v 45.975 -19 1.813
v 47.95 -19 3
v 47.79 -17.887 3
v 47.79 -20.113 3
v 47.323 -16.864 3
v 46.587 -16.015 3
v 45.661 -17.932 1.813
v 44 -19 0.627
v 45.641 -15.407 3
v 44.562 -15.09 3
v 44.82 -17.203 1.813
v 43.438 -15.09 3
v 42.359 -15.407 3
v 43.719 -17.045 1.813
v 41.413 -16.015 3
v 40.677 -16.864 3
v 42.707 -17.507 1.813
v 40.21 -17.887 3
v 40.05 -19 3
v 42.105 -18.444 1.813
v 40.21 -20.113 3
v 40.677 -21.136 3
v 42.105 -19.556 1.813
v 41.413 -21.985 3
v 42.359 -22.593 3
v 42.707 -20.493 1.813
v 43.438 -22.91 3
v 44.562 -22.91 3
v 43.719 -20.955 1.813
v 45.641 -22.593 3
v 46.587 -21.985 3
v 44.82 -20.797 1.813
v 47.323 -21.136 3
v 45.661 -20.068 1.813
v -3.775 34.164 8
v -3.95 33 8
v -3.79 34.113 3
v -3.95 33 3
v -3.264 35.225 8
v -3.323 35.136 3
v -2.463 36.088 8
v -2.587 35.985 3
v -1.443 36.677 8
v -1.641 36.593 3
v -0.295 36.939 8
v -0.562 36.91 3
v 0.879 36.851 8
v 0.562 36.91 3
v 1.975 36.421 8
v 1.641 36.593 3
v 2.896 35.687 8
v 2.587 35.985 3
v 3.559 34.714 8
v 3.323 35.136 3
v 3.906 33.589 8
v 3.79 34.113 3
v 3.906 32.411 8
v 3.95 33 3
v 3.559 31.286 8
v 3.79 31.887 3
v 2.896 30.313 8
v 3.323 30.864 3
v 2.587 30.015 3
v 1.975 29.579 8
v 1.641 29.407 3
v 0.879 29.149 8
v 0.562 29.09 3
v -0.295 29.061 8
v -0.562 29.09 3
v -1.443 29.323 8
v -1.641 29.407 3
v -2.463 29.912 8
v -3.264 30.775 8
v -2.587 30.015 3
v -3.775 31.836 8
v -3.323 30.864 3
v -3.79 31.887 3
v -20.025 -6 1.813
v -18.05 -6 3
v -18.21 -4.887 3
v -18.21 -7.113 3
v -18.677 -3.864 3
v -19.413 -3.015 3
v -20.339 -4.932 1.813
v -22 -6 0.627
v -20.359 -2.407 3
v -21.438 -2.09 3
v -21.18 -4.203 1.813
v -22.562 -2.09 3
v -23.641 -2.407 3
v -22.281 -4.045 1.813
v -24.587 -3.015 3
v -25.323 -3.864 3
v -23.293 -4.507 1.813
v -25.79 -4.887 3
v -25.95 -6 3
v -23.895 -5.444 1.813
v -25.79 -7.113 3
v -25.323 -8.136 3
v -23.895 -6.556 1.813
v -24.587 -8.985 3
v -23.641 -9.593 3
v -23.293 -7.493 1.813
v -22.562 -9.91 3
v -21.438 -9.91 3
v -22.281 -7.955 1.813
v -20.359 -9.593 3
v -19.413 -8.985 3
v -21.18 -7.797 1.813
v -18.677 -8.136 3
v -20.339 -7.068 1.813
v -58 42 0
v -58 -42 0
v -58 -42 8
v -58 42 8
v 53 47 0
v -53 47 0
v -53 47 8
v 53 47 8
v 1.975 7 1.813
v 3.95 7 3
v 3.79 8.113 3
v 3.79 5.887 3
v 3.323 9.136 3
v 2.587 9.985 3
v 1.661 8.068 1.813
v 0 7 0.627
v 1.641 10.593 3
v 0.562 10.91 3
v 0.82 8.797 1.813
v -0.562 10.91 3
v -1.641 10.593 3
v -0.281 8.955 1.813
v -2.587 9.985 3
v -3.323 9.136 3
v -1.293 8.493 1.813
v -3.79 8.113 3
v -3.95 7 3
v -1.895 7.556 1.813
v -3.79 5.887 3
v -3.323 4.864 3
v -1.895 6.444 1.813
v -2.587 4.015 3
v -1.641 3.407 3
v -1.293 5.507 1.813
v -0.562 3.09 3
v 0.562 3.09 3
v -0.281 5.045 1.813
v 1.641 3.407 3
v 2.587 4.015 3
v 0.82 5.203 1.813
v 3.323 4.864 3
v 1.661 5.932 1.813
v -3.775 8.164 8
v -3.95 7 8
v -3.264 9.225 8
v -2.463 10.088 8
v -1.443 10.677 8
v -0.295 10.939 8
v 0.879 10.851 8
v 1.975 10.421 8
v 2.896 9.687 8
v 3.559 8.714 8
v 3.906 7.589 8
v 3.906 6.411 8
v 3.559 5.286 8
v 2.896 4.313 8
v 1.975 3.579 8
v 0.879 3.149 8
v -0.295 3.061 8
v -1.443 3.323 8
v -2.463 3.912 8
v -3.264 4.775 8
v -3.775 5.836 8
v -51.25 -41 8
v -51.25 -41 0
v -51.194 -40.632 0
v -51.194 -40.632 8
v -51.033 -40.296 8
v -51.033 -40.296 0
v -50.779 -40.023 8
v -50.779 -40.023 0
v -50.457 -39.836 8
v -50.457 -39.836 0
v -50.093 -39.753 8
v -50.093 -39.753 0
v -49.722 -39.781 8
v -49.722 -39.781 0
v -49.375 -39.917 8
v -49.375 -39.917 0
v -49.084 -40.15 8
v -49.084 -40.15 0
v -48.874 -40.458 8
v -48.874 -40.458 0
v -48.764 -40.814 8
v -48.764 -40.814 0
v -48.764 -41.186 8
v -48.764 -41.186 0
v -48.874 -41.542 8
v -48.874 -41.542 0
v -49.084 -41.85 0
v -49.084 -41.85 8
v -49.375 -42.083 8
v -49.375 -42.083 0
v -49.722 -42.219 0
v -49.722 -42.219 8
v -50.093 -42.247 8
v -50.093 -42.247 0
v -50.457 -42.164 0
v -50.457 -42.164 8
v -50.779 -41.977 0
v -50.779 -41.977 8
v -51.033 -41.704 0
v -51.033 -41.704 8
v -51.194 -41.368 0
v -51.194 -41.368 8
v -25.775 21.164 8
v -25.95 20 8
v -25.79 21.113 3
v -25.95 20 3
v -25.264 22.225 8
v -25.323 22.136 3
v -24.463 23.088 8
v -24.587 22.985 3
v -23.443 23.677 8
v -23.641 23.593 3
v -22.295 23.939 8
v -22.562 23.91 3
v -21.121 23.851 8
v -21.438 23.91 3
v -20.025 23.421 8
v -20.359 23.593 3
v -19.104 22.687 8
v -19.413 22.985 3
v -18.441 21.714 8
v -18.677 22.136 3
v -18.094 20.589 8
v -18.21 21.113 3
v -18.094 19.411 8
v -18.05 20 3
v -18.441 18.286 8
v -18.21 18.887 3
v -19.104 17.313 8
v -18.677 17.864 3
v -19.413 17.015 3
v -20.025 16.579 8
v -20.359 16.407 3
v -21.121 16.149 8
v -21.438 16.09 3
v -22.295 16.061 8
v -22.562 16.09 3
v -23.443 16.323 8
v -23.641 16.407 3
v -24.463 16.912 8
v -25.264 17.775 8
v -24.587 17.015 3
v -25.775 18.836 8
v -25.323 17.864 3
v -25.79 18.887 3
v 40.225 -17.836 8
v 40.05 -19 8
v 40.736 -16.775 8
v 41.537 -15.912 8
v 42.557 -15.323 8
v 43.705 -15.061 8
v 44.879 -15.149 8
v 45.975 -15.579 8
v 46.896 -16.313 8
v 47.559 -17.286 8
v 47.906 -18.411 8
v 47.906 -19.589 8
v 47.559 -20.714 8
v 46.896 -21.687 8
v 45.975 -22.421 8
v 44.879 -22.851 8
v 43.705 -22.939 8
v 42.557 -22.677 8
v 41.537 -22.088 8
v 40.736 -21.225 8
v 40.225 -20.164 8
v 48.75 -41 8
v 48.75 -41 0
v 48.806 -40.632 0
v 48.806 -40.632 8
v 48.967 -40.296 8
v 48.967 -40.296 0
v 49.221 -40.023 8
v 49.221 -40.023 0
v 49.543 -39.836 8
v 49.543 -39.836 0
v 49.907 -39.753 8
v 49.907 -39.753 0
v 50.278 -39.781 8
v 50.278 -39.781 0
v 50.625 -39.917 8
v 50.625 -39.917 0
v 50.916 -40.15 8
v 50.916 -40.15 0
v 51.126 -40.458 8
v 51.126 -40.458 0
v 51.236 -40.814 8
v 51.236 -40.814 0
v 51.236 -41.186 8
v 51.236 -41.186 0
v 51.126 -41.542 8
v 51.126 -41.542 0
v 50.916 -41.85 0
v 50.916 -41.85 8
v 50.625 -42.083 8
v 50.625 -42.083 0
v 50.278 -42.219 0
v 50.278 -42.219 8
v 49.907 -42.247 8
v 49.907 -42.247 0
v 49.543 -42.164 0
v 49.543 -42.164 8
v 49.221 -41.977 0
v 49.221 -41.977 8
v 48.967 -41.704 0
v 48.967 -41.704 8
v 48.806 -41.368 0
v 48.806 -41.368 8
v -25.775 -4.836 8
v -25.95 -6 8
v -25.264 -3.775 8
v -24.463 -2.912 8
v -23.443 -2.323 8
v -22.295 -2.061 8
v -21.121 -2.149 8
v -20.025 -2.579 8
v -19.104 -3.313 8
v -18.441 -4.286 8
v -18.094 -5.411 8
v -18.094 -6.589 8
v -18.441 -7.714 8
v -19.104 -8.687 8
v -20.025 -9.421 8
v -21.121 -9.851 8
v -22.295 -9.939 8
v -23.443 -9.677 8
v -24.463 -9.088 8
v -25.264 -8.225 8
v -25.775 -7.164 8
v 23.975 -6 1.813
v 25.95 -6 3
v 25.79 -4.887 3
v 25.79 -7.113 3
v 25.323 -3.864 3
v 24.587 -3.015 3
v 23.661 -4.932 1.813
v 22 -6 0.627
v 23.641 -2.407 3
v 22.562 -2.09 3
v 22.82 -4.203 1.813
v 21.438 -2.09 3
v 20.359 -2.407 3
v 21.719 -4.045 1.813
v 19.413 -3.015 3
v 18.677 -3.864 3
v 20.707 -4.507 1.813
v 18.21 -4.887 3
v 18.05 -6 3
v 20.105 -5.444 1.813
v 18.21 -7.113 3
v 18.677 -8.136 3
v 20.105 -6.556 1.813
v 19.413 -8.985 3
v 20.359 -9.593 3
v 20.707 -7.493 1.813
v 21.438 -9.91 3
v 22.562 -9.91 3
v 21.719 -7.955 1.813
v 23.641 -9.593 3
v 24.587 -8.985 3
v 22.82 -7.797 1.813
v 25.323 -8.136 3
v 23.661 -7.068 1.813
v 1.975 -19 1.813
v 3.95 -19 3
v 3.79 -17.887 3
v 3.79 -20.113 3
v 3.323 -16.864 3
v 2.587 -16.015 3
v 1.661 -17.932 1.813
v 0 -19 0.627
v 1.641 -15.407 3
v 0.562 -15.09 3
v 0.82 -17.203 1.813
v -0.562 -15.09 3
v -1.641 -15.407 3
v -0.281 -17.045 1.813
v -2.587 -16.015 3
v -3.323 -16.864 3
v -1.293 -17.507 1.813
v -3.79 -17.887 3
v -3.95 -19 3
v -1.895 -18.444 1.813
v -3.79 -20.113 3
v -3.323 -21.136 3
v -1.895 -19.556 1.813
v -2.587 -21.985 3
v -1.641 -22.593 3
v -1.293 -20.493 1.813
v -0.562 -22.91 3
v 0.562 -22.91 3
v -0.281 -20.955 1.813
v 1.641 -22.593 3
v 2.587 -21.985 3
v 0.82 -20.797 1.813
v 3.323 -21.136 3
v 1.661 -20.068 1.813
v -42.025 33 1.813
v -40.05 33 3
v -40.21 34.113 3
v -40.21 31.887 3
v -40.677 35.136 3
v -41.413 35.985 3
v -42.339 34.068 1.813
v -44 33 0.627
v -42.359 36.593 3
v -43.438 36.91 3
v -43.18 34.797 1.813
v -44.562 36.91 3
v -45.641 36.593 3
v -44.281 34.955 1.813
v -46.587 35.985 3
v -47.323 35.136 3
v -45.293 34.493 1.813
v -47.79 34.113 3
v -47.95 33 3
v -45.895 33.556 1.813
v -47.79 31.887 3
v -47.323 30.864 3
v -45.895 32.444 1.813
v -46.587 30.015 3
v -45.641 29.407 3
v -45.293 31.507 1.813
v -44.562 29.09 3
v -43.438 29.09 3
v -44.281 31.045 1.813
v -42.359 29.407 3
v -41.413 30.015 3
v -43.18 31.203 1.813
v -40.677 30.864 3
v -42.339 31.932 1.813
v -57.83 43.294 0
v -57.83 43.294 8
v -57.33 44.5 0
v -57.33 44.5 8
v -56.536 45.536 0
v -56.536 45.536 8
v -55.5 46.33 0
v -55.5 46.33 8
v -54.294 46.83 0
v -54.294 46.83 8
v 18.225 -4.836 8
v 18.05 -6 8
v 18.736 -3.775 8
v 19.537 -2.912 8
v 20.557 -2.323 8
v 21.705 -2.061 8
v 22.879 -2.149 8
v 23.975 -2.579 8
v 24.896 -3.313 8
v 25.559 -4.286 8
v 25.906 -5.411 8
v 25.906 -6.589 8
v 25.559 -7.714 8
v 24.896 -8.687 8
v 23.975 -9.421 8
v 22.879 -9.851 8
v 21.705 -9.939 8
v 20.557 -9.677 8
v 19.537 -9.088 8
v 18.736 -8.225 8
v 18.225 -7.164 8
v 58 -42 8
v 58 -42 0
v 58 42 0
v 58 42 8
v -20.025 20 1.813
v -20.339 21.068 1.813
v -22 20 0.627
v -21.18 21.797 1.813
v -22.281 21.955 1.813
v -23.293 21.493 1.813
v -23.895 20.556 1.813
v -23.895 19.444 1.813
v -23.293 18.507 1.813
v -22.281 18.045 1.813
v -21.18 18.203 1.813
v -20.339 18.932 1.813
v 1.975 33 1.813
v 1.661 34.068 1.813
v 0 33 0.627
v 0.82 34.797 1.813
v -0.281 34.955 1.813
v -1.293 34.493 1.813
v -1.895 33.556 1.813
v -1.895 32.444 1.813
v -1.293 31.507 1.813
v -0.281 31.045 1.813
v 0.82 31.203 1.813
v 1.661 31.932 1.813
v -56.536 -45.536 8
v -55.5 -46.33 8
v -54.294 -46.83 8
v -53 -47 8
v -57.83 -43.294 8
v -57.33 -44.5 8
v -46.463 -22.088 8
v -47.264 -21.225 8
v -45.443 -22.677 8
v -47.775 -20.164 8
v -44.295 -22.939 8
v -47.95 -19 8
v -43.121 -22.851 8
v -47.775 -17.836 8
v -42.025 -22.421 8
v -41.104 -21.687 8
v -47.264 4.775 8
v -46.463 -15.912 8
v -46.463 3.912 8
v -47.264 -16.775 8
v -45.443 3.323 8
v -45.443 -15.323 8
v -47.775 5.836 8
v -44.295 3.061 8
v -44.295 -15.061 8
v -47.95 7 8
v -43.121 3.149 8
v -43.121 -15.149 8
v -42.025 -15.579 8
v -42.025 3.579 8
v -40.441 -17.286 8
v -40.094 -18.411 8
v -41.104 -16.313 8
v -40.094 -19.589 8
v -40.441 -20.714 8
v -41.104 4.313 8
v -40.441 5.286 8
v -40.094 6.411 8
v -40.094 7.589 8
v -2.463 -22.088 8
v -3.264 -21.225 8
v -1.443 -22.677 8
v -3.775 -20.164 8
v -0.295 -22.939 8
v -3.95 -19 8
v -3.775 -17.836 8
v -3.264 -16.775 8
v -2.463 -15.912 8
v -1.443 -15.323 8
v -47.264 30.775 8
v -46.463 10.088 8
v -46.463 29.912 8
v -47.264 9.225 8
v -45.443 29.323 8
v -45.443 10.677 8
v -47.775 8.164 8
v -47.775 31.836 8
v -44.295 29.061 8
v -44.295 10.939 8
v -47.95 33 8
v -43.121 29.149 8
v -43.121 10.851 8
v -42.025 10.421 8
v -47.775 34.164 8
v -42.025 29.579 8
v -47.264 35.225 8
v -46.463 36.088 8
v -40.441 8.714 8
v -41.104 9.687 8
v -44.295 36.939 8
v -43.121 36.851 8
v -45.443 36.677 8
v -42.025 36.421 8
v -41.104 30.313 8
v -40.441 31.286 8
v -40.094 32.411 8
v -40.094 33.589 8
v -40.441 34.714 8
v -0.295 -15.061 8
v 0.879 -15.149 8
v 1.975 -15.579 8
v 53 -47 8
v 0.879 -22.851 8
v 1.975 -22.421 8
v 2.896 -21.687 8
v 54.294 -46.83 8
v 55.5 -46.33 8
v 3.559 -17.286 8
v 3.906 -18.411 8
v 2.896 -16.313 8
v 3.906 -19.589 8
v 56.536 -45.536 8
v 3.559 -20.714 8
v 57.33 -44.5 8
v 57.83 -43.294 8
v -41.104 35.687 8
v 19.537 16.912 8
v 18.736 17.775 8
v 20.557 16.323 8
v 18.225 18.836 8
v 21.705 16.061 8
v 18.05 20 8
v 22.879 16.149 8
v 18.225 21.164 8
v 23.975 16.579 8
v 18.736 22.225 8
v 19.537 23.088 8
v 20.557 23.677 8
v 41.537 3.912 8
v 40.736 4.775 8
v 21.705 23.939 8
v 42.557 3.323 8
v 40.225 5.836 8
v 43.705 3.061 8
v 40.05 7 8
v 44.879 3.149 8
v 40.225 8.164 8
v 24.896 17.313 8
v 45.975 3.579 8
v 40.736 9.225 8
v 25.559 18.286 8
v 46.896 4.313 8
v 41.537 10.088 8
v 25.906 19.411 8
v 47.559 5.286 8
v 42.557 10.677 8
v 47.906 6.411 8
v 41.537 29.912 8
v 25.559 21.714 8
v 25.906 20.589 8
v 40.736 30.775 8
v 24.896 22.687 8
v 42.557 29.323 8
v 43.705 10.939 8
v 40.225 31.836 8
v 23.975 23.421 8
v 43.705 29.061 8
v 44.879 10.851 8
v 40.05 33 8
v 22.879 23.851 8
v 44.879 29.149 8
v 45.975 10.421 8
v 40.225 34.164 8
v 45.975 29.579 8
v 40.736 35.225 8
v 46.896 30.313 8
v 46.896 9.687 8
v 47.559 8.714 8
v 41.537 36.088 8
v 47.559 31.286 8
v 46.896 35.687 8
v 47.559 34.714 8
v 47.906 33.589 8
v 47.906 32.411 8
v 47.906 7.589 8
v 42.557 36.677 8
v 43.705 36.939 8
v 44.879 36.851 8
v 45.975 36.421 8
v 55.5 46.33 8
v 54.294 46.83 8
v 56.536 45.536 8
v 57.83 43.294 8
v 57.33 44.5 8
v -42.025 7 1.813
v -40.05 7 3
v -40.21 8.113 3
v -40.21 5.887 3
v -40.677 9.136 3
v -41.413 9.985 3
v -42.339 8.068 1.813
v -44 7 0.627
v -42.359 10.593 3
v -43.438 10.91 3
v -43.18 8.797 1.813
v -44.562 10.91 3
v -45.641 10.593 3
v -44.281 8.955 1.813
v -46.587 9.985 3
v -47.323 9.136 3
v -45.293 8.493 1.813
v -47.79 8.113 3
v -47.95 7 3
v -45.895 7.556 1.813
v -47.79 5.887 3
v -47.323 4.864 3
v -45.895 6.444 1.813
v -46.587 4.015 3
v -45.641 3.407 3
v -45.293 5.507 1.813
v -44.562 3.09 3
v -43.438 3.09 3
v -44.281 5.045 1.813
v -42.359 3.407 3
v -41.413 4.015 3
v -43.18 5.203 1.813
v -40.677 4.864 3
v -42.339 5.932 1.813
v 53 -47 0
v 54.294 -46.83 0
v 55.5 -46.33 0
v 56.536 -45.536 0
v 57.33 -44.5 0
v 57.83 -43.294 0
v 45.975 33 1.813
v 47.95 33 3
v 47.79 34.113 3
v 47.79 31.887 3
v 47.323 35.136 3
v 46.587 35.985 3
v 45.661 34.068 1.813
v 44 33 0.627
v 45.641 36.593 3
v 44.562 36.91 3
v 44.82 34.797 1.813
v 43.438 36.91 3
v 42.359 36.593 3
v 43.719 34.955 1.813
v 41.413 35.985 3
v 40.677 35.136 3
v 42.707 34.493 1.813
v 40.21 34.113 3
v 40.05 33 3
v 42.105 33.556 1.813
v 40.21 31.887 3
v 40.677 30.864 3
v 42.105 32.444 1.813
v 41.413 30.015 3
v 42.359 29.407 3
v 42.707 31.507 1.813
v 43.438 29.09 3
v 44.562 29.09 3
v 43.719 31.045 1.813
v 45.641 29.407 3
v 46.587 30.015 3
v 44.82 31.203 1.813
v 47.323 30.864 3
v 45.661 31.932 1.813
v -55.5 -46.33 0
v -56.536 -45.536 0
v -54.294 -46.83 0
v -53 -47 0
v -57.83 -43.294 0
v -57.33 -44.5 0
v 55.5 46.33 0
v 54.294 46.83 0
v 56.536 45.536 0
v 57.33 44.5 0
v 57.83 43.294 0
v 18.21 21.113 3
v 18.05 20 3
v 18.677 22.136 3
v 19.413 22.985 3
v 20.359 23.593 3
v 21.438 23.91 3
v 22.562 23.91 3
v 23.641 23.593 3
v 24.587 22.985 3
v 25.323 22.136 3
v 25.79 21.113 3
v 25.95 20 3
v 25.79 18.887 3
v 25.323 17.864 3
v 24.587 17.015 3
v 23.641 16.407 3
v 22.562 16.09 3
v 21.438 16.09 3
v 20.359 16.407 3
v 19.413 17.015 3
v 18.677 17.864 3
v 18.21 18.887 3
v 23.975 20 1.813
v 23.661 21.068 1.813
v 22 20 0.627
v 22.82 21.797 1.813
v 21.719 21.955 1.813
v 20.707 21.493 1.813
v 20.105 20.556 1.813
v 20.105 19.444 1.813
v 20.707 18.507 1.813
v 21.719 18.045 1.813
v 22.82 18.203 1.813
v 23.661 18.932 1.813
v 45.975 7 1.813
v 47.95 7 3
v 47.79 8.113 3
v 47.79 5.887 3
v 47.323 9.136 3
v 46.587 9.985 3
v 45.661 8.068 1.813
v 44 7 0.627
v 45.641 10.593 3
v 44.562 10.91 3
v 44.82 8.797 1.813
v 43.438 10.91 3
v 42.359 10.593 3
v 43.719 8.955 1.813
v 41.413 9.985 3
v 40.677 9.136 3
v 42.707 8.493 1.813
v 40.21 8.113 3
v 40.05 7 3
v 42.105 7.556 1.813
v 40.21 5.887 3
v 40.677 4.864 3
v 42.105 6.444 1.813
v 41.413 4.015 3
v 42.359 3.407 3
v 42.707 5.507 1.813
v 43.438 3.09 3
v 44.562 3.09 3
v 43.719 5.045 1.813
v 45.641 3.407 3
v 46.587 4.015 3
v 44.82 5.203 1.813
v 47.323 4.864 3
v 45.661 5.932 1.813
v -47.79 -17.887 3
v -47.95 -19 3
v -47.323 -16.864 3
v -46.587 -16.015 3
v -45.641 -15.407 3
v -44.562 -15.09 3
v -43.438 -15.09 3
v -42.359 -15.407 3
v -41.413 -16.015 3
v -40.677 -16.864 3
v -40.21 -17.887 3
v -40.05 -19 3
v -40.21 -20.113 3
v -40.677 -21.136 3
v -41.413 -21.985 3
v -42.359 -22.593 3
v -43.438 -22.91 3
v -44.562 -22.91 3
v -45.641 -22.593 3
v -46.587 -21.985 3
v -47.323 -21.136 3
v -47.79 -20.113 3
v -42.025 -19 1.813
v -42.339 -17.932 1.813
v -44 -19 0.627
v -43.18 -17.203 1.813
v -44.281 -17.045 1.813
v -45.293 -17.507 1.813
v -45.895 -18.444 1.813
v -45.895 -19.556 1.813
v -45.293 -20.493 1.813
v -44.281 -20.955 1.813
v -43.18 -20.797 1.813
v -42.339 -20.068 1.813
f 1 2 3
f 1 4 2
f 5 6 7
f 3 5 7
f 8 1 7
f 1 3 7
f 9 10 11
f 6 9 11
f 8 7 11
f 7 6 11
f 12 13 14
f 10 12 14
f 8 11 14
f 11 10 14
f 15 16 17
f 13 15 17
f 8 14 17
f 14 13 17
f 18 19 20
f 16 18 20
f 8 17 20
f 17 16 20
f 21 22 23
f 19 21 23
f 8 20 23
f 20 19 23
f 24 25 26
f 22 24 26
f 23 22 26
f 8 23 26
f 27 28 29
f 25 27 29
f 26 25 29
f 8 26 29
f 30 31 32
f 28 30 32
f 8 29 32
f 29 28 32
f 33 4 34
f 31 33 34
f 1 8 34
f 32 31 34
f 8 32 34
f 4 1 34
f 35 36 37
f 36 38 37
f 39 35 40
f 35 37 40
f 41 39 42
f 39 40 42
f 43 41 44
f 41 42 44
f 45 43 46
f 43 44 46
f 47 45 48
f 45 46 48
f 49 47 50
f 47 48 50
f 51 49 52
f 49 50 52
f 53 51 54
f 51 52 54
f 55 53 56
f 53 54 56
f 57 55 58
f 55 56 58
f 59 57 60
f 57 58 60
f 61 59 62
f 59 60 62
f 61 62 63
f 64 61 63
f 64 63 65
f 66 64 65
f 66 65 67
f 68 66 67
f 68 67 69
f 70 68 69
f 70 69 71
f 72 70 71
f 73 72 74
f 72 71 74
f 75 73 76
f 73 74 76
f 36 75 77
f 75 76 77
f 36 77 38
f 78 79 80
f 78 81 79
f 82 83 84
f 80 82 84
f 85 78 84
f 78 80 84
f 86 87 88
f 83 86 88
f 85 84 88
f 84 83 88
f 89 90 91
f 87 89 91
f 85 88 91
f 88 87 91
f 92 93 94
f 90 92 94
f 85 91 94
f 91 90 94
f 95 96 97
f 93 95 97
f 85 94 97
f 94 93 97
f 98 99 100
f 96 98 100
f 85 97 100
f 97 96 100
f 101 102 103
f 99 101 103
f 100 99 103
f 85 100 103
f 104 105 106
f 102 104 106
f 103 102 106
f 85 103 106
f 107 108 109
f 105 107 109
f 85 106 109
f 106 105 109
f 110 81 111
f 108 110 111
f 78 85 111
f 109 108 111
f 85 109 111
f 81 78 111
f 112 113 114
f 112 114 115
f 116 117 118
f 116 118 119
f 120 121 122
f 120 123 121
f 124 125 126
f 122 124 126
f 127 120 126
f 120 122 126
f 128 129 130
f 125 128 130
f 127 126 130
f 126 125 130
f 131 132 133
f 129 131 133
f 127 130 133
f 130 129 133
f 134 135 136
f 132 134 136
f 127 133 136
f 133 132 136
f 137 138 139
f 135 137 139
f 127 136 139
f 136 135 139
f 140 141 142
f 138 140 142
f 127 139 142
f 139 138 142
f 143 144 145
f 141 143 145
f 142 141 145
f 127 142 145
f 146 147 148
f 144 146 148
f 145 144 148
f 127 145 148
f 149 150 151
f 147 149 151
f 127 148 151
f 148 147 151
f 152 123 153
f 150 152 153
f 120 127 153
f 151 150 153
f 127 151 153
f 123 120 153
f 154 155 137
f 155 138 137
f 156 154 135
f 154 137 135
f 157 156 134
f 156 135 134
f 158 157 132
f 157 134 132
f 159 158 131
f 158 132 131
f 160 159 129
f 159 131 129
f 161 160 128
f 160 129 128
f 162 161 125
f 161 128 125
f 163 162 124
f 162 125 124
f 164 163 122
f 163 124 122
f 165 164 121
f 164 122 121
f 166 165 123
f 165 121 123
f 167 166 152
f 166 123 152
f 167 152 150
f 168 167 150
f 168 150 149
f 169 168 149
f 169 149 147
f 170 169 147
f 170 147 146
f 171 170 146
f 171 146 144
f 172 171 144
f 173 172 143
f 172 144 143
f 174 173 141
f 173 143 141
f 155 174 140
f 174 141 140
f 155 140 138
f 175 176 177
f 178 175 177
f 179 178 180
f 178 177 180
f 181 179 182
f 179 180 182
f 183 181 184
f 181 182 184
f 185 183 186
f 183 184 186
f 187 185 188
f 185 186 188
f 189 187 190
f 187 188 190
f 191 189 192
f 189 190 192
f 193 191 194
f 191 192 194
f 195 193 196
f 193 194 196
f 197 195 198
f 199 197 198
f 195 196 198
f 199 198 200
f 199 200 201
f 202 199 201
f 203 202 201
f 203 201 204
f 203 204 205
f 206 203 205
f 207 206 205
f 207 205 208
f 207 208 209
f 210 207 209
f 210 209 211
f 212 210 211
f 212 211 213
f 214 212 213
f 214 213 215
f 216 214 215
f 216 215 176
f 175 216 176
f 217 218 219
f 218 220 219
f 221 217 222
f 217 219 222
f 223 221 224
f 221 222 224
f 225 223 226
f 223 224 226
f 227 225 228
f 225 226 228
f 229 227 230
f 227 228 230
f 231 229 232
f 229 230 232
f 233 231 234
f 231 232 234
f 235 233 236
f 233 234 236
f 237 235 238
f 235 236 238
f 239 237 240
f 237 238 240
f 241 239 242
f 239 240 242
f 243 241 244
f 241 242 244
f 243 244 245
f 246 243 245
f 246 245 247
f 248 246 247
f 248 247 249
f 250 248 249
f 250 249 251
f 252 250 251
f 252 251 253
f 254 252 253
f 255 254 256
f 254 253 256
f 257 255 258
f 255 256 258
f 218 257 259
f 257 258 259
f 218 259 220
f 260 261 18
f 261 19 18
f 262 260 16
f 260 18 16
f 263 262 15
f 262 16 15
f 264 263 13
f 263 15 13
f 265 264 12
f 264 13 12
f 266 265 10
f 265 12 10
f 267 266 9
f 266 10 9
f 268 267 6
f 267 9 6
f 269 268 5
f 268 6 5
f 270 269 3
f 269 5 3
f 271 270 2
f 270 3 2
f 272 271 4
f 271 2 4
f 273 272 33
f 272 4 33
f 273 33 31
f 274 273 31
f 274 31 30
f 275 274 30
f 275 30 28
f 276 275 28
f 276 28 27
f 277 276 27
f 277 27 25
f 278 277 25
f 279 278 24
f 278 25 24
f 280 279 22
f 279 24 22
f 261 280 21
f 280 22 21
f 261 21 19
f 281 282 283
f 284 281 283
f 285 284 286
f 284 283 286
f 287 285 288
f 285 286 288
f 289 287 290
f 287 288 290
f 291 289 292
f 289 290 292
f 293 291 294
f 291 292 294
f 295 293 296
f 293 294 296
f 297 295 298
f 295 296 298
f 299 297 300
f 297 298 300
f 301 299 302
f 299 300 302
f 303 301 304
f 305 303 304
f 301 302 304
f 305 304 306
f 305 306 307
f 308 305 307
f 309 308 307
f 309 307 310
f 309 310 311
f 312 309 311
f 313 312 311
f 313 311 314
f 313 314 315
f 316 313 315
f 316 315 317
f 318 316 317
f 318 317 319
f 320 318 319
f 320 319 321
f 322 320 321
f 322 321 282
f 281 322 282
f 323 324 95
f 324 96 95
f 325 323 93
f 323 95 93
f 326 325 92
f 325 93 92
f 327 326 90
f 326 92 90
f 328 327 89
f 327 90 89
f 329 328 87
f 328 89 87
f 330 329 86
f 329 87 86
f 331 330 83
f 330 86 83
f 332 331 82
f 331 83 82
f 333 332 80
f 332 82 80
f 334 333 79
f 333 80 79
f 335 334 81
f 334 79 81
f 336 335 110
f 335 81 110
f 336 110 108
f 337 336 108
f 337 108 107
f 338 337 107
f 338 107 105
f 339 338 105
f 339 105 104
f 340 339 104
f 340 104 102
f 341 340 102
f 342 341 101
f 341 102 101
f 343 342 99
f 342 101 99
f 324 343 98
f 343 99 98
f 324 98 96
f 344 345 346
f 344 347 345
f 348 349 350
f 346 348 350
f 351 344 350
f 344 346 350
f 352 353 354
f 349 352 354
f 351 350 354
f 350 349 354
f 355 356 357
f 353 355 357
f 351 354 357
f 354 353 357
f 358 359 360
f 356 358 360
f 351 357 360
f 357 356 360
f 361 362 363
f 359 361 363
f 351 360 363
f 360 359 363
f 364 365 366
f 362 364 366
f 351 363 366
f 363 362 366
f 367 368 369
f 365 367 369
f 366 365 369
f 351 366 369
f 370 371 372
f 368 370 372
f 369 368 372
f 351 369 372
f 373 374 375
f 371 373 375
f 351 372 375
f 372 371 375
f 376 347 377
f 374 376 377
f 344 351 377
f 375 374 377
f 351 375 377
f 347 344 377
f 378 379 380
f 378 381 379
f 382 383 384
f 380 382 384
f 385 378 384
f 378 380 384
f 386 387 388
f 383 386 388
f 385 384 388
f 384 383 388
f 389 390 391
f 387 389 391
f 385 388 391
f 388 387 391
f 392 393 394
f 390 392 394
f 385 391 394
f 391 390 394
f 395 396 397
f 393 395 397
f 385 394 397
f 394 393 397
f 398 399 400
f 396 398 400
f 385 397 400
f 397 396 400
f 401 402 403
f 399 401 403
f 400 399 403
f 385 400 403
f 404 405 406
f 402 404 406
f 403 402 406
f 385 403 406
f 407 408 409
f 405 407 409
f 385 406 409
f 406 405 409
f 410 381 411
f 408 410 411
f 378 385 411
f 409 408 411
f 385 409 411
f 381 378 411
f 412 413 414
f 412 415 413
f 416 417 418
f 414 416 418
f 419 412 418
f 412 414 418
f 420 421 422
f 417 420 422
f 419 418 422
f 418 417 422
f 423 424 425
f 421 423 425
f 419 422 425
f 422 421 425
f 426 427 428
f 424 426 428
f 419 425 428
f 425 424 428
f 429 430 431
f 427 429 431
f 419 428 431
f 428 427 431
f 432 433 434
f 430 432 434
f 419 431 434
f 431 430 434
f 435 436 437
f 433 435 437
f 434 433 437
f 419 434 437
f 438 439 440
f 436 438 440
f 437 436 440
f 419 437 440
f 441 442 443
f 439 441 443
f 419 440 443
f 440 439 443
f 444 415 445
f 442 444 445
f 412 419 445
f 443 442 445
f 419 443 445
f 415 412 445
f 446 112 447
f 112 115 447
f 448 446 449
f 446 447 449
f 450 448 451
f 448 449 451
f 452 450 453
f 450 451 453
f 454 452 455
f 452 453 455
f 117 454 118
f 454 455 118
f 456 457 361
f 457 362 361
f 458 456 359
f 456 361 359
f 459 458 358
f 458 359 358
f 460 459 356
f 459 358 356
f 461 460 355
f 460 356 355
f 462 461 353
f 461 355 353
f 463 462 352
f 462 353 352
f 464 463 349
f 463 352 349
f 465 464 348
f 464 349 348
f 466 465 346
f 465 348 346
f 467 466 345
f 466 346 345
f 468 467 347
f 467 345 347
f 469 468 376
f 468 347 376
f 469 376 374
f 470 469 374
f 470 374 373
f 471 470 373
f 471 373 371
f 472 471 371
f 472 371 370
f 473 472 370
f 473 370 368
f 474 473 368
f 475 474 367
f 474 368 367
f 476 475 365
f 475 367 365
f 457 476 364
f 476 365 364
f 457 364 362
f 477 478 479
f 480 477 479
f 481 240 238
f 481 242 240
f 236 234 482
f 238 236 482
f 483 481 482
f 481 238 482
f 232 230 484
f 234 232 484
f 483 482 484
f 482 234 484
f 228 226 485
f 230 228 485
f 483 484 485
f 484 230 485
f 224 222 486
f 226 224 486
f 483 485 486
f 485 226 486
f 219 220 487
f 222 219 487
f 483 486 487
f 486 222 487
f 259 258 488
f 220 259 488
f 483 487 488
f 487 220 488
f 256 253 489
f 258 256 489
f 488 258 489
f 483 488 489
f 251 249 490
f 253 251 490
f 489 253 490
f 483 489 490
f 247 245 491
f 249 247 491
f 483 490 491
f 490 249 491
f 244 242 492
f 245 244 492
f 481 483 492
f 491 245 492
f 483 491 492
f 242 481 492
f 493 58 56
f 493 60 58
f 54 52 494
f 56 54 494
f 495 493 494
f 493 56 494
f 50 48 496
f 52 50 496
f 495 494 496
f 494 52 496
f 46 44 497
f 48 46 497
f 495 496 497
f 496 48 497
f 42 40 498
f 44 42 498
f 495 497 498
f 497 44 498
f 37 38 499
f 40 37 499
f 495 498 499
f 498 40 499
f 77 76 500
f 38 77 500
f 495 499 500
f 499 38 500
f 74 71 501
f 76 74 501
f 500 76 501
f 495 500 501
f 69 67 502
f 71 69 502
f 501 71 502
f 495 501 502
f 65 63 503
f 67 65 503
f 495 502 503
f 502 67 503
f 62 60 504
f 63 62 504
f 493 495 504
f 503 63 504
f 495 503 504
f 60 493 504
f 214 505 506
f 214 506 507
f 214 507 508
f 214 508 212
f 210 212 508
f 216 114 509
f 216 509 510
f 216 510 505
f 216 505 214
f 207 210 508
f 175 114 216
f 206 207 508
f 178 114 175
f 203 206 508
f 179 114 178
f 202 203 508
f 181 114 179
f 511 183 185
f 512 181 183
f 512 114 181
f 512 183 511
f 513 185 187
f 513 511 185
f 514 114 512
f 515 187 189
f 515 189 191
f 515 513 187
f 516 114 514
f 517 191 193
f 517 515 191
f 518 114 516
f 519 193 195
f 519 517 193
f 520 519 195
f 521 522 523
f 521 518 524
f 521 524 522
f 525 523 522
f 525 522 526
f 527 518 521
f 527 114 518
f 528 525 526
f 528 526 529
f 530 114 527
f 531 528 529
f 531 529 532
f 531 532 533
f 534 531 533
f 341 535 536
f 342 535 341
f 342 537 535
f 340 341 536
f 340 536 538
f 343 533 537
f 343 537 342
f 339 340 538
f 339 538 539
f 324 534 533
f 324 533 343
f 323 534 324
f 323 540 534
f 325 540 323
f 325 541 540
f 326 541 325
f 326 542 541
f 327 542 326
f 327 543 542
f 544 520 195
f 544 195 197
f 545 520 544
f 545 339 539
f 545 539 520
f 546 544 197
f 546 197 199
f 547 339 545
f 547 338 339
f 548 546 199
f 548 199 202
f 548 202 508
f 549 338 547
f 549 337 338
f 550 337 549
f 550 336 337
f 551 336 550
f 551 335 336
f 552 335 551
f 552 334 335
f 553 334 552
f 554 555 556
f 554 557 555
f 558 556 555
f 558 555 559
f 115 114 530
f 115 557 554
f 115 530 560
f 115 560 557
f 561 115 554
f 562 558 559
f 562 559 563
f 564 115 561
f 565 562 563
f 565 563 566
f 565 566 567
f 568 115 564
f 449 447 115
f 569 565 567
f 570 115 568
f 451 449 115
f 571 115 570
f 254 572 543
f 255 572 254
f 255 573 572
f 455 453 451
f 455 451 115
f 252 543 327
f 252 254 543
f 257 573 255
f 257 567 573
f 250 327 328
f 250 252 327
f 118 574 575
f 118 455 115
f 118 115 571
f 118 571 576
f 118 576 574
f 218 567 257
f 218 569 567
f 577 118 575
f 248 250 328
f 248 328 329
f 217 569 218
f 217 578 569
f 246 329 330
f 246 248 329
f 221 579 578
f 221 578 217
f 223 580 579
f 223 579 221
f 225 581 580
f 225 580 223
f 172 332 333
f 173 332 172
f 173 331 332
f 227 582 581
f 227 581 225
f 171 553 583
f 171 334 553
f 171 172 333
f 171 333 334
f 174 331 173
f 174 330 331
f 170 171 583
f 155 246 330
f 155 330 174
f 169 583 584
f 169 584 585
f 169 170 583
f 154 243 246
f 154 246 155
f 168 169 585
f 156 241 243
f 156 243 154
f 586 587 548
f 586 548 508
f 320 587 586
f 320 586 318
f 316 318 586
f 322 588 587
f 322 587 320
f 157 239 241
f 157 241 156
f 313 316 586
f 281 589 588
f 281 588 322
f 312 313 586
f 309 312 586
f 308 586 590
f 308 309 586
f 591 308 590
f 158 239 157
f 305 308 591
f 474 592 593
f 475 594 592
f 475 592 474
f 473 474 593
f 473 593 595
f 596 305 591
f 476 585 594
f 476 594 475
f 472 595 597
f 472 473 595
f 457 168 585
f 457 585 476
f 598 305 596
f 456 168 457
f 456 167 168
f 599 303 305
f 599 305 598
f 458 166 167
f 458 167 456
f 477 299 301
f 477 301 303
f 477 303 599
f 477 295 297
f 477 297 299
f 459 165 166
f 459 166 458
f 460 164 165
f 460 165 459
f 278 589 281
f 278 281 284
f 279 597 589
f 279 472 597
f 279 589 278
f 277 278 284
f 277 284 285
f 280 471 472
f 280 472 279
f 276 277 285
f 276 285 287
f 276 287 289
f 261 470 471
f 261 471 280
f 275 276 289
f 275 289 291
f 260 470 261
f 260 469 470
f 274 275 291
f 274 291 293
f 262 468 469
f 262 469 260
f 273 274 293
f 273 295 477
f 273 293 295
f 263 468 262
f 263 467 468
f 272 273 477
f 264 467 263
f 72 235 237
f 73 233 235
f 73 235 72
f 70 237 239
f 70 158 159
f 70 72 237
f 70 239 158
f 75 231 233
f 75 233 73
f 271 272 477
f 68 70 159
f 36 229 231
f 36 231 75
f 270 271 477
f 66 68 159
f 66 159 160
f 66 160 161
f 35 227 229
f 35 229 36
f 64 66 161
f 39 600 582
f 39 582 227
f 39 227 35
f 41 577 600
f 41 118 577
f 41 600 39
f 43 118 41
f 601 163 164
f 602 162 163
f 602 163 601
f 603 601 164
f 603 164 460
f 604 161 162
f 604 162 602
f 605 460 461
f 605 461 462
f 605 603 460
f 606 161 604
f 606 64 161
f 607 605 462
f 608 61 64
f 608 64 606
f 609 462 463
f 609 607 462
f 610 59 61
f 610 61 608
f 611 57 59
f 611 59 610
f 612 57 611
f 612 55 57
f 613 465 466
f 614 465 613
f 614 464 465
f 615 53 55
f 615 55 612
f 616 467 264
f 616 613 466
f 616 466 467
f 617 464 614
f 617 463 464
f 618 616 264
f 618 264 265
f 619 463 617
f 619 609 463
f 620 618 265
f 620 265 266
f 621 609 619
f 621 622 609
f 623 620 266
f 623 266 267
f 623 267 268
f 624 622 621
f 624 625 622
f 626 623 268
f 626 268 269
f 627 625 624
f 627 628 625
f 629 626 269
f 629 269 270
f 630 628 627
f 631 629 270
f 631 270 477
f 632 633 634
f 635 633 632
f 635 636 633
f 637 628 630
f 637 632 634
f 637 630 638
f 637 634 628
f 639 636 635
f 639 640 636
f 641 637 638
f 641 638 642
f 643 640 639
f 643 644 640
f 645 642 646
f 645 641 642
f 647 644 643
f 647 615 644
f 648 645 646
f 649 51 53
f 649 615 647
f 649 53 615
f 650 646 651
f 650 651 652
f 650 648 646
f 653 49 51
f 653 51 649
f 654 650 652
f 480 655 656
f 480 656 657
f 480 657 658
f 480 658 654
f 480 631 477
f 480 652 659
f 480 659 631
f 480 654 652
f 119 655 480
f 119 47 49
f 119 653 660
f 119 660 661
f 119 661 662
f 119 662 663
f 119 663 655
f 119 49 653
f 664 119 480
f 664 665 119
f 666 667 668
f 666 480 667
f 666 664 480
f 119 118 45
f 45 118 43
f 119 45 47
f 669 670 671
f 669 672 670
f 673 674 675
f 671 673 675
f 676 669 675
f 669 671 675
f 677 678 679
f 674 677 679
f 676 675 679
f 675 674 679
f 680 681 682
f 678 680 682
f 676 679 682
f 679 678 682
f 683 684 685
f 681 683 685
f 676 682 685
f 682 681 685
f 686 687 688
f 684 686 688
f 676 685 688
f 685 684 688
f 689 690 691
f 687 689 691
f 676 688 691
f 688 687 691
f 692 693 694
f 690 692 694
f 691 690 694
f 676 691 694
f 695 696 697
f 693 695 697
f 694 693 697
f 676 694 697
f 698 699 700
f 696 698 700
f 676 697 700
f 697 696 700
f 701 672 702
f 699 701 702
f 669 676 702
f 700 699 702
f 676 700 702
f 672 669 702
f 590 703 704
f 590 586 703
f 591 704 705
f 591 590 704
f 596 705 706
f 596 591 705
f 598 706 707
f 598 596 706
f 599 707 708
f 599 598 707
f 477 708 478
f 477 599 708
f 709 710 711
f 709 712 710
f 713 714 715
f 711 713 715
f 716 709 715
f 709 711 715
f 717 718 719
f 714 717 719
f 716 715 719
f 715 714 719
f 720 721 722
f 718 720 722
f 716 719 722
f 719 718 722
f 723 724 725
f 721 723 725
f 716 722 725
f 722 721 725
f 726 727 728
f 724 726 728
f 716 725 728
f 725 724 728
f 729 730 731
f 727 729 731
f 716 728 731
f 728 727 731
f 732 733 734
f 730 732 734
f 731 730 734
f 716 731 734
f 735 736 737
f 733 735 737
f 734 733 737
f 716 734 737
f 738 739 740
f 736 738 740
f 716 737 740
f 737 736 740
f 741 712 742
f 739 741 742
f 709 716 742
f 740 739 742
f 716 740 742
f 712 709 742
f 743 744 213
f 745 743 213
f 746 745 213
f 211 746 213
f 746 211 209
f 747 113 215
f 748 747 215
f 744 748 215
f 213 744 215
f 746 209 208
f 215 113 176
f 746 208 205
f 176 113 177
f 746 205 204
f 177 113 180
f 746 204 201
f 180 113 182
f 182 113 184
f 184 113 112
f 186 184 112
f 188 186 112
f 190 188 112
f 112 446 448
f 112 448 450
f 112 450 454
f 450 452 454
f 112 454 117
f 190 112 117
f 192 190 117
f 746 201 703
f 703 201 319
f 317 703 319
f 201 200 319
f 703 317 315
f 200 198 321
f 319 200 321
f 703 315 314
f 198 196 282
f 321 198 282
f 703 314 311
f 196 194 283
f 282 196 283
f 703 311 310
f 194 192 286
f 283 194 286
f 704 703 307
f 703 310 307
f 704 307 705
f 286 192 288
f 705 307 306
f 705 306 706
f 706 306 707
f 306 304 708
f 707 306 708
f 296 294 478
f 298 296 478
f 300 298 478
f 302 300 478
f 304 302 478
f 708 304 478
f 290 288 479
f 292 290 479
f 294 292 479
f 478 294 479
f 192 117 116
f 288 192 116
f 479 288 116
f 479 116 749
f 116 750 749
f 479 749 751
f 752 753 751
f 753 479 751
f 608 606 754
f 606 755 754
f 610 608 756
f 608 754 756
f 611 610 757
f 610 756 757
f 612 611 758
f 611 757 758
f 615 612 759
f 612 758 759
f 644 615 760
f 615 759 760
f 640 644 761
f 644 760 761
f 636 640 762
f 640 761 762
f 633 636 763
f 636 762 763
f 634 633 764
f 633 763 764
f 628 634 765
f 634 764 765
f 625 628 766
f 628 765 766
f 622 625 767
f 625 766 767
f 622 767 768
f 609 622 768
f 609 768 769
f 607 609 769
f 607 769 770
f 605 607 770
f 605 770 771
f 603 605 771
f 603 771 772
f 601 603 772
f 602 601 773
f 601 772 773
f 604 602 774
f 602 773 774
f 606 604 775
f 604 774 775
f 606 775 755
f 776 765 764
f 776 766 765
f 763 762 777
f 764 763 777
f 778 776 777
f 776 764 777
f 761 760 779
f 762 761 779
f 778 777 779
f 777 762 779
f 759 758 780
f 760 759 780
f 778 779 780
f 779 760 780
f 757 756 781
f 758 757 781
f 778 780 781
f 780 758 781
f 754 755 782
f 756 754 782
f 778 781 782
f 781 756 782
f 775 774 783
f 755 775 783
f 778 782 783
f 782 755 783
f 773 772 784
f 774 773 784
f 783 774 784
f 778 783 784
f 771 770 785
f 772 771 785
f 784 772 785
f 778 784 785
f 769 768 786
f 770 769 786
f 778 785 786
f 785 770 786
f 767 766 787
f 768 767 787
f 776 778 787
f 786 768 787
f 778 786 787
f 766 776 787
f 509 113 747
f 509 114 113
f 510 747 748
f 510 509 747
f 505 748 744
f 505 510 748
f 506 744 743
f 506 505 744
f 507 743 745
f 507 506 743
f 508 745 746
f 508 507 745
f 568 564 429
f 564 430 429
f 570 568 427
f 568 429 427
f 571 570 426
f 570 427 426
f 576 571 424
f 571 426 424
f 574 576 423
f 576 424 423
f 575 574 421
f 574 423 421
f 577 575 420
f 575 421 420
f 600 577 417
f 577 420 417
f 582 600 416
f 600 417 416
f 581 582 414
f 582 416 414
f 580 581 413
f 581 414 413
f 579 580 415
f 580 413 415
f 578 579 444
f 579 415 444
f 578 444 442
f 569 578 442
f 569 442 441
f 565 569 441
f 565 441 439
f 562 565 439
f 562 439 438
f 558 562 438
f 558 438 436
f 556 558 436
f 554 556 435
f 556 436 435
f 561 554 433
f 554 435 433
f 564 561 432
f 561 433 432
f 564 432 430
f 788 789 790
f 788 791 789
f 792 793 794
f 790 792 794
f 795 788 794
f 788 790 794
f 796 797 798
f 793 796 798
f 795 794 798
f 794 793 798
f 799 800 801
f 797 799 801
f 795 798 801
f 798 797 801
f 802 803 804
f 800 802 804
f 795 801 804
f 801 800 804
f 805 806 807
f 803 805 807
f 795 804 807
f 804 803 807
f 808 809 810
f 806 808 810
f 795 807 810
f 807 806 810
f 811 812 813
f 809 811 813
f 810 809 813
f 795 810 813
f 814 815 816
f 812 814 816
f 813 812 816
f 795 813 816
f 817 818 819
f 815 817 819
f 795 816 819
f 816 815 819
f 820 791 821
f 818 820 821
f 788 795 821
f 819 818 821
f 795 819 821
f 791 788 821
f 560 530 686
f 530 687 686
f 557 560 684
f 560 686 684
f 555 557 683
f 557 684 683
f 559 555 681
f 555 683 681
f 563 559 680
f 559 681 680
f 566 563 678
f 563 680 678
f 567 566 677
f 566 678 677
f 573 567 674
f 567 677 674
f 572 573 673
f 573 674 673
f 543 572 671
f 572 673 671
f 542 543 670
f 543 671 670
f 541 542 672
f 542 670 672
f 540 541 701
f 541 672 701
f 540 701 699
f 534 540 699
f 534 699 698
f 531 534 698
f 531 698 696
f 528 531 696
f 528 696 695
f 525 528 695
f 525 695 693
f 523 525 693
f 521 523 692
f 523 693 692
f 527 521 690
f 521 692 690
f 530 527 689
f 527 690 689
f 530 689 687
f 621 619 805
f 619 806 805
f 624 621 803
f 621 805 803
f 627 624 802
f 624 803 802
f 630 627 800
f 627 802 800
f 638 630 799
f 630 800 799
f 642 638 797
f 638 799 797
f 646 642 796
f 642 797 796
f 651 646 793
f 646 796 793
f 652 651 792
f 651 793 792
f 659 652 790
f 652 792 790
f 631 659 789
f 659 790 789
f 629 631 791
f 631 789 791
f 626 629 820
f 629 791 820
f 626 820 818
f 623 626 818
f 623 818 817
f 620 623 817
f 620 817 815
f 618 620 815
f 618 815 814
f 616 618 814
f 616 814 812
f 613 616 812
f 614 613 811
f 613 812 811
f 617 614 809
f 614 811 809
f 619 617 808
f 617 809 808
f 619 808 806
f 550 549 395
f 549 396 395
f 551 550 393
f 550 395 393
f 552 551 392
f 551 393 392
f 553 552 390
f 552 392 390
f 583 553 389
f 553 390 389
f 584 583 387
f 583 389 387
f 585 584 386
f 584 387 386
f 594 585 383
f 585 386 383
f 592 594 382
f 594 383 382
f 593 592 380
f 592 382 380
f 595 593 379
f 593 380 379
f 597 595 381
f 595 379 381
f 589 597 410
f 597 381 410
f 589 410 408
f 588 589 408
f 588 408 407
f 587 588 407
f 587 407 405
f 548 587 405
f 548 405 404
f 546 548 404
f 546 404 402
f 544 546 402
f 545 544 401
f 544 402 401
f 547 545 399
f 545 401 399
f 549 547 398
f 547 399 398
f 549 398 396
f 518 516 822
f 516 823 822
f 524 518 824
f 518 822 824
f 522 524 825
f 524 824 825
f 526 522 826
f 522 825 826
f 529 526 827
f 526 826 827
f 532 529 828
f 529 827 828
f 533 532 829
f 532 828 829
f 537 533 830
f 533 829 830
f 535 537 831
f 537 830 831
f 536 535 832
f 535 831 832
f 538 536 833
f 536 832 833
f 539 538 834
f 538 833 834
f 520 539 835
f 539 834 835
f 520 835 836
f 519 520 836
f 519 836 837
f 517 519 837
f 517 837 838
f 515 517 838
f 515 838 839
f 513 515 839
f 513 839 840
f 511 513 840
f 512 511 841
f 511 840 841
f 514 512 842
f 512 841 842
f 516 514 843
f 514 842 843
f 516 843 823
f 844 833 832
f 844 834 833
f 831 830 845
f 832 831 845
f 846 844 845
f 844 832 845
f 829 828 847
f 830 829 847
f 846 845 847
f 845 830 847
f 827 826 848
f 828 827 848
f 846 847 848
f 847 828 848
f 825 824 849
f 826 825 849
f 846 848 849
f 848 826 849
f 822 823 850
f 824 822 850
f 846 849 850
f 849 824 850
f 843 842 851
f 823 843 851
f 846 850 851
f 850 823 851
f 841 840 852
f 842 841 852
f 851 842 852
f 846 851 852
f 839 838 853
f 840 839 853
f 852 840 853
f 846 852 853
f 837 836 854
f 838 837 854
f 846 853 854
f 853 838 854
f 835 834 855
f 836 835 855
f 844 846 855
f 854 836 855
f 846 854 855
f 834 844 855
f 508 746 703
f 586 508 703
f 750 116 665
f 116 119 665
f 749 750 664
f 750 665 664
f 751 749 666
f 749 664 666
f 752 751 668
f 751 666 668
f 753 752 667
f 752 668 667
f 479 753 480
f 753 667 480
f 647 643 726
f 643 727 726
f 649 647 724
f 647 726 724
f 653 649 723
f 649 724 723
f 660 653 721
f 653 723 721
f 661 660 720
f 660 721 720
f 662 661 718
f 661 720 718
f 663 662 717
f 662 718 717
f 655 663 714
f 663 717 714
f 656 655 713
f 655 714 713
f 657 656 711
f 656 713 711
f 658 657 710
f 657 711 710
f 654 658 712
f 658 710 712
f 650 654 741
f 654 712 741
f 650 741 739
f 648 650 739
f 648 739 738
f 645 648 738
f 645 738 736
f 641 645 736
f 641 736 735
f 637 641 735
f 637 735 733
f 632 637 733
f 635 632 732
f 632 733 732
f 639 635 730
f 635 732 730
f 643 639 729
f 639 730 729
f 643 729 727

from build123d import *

# Parameters (mm, degrees)
F0_W     = 116
F0_H     = 94
F1_DEPTH = 8
F3_D     = 7.9
F3_DEPTH = 5
F3_TIP   = 2.3733994452
F5_D     = 2.5
F6_R     = 5


with BuildPart() as f1:
    # F0 (on Top) → F1 (new body)
    with BuildSketch(Plane.XY):
        Rectangle(F0_W, F0_H)
    extrude(amount=F1_DEPTH)

    # F3
    with Locations(Plane.XY.offset(8)):
        with Locations((-44, 33), (-22, 20), (-44, 7), (-44, -19), (-22, -6), (0, -19), (0, 7), (0, 33), (22, 20), (22, -6), (44, 7), (44, 33), (44, -19)):
            Hole(F3_D / 2, depth=F3_DEPTH)
            with Locations((0, 0, -(F3_DEPTH + F3_TIP / 2))):  # 118° drill point
                Cone(0, F3_D / 2, F3_TIP, mode=Mode.SUBTRACT)

    # F5 (through all)
    with Locations(Plane.XY.offset(8)):
        with Locations((-50, -41), (50, -41)):
            Hole(F5_D / 2)

    # F6
    f6_edges = [f1.edges().sort_by_distance(p)[0] for p in [
        (-58, -47, 4),
        (58, -47, 4),
        (-58, 47, 4),
        (58, 47, 4),
    ]]
    fillet(f6_edges, radius=F6_R)


solid = f1.part
